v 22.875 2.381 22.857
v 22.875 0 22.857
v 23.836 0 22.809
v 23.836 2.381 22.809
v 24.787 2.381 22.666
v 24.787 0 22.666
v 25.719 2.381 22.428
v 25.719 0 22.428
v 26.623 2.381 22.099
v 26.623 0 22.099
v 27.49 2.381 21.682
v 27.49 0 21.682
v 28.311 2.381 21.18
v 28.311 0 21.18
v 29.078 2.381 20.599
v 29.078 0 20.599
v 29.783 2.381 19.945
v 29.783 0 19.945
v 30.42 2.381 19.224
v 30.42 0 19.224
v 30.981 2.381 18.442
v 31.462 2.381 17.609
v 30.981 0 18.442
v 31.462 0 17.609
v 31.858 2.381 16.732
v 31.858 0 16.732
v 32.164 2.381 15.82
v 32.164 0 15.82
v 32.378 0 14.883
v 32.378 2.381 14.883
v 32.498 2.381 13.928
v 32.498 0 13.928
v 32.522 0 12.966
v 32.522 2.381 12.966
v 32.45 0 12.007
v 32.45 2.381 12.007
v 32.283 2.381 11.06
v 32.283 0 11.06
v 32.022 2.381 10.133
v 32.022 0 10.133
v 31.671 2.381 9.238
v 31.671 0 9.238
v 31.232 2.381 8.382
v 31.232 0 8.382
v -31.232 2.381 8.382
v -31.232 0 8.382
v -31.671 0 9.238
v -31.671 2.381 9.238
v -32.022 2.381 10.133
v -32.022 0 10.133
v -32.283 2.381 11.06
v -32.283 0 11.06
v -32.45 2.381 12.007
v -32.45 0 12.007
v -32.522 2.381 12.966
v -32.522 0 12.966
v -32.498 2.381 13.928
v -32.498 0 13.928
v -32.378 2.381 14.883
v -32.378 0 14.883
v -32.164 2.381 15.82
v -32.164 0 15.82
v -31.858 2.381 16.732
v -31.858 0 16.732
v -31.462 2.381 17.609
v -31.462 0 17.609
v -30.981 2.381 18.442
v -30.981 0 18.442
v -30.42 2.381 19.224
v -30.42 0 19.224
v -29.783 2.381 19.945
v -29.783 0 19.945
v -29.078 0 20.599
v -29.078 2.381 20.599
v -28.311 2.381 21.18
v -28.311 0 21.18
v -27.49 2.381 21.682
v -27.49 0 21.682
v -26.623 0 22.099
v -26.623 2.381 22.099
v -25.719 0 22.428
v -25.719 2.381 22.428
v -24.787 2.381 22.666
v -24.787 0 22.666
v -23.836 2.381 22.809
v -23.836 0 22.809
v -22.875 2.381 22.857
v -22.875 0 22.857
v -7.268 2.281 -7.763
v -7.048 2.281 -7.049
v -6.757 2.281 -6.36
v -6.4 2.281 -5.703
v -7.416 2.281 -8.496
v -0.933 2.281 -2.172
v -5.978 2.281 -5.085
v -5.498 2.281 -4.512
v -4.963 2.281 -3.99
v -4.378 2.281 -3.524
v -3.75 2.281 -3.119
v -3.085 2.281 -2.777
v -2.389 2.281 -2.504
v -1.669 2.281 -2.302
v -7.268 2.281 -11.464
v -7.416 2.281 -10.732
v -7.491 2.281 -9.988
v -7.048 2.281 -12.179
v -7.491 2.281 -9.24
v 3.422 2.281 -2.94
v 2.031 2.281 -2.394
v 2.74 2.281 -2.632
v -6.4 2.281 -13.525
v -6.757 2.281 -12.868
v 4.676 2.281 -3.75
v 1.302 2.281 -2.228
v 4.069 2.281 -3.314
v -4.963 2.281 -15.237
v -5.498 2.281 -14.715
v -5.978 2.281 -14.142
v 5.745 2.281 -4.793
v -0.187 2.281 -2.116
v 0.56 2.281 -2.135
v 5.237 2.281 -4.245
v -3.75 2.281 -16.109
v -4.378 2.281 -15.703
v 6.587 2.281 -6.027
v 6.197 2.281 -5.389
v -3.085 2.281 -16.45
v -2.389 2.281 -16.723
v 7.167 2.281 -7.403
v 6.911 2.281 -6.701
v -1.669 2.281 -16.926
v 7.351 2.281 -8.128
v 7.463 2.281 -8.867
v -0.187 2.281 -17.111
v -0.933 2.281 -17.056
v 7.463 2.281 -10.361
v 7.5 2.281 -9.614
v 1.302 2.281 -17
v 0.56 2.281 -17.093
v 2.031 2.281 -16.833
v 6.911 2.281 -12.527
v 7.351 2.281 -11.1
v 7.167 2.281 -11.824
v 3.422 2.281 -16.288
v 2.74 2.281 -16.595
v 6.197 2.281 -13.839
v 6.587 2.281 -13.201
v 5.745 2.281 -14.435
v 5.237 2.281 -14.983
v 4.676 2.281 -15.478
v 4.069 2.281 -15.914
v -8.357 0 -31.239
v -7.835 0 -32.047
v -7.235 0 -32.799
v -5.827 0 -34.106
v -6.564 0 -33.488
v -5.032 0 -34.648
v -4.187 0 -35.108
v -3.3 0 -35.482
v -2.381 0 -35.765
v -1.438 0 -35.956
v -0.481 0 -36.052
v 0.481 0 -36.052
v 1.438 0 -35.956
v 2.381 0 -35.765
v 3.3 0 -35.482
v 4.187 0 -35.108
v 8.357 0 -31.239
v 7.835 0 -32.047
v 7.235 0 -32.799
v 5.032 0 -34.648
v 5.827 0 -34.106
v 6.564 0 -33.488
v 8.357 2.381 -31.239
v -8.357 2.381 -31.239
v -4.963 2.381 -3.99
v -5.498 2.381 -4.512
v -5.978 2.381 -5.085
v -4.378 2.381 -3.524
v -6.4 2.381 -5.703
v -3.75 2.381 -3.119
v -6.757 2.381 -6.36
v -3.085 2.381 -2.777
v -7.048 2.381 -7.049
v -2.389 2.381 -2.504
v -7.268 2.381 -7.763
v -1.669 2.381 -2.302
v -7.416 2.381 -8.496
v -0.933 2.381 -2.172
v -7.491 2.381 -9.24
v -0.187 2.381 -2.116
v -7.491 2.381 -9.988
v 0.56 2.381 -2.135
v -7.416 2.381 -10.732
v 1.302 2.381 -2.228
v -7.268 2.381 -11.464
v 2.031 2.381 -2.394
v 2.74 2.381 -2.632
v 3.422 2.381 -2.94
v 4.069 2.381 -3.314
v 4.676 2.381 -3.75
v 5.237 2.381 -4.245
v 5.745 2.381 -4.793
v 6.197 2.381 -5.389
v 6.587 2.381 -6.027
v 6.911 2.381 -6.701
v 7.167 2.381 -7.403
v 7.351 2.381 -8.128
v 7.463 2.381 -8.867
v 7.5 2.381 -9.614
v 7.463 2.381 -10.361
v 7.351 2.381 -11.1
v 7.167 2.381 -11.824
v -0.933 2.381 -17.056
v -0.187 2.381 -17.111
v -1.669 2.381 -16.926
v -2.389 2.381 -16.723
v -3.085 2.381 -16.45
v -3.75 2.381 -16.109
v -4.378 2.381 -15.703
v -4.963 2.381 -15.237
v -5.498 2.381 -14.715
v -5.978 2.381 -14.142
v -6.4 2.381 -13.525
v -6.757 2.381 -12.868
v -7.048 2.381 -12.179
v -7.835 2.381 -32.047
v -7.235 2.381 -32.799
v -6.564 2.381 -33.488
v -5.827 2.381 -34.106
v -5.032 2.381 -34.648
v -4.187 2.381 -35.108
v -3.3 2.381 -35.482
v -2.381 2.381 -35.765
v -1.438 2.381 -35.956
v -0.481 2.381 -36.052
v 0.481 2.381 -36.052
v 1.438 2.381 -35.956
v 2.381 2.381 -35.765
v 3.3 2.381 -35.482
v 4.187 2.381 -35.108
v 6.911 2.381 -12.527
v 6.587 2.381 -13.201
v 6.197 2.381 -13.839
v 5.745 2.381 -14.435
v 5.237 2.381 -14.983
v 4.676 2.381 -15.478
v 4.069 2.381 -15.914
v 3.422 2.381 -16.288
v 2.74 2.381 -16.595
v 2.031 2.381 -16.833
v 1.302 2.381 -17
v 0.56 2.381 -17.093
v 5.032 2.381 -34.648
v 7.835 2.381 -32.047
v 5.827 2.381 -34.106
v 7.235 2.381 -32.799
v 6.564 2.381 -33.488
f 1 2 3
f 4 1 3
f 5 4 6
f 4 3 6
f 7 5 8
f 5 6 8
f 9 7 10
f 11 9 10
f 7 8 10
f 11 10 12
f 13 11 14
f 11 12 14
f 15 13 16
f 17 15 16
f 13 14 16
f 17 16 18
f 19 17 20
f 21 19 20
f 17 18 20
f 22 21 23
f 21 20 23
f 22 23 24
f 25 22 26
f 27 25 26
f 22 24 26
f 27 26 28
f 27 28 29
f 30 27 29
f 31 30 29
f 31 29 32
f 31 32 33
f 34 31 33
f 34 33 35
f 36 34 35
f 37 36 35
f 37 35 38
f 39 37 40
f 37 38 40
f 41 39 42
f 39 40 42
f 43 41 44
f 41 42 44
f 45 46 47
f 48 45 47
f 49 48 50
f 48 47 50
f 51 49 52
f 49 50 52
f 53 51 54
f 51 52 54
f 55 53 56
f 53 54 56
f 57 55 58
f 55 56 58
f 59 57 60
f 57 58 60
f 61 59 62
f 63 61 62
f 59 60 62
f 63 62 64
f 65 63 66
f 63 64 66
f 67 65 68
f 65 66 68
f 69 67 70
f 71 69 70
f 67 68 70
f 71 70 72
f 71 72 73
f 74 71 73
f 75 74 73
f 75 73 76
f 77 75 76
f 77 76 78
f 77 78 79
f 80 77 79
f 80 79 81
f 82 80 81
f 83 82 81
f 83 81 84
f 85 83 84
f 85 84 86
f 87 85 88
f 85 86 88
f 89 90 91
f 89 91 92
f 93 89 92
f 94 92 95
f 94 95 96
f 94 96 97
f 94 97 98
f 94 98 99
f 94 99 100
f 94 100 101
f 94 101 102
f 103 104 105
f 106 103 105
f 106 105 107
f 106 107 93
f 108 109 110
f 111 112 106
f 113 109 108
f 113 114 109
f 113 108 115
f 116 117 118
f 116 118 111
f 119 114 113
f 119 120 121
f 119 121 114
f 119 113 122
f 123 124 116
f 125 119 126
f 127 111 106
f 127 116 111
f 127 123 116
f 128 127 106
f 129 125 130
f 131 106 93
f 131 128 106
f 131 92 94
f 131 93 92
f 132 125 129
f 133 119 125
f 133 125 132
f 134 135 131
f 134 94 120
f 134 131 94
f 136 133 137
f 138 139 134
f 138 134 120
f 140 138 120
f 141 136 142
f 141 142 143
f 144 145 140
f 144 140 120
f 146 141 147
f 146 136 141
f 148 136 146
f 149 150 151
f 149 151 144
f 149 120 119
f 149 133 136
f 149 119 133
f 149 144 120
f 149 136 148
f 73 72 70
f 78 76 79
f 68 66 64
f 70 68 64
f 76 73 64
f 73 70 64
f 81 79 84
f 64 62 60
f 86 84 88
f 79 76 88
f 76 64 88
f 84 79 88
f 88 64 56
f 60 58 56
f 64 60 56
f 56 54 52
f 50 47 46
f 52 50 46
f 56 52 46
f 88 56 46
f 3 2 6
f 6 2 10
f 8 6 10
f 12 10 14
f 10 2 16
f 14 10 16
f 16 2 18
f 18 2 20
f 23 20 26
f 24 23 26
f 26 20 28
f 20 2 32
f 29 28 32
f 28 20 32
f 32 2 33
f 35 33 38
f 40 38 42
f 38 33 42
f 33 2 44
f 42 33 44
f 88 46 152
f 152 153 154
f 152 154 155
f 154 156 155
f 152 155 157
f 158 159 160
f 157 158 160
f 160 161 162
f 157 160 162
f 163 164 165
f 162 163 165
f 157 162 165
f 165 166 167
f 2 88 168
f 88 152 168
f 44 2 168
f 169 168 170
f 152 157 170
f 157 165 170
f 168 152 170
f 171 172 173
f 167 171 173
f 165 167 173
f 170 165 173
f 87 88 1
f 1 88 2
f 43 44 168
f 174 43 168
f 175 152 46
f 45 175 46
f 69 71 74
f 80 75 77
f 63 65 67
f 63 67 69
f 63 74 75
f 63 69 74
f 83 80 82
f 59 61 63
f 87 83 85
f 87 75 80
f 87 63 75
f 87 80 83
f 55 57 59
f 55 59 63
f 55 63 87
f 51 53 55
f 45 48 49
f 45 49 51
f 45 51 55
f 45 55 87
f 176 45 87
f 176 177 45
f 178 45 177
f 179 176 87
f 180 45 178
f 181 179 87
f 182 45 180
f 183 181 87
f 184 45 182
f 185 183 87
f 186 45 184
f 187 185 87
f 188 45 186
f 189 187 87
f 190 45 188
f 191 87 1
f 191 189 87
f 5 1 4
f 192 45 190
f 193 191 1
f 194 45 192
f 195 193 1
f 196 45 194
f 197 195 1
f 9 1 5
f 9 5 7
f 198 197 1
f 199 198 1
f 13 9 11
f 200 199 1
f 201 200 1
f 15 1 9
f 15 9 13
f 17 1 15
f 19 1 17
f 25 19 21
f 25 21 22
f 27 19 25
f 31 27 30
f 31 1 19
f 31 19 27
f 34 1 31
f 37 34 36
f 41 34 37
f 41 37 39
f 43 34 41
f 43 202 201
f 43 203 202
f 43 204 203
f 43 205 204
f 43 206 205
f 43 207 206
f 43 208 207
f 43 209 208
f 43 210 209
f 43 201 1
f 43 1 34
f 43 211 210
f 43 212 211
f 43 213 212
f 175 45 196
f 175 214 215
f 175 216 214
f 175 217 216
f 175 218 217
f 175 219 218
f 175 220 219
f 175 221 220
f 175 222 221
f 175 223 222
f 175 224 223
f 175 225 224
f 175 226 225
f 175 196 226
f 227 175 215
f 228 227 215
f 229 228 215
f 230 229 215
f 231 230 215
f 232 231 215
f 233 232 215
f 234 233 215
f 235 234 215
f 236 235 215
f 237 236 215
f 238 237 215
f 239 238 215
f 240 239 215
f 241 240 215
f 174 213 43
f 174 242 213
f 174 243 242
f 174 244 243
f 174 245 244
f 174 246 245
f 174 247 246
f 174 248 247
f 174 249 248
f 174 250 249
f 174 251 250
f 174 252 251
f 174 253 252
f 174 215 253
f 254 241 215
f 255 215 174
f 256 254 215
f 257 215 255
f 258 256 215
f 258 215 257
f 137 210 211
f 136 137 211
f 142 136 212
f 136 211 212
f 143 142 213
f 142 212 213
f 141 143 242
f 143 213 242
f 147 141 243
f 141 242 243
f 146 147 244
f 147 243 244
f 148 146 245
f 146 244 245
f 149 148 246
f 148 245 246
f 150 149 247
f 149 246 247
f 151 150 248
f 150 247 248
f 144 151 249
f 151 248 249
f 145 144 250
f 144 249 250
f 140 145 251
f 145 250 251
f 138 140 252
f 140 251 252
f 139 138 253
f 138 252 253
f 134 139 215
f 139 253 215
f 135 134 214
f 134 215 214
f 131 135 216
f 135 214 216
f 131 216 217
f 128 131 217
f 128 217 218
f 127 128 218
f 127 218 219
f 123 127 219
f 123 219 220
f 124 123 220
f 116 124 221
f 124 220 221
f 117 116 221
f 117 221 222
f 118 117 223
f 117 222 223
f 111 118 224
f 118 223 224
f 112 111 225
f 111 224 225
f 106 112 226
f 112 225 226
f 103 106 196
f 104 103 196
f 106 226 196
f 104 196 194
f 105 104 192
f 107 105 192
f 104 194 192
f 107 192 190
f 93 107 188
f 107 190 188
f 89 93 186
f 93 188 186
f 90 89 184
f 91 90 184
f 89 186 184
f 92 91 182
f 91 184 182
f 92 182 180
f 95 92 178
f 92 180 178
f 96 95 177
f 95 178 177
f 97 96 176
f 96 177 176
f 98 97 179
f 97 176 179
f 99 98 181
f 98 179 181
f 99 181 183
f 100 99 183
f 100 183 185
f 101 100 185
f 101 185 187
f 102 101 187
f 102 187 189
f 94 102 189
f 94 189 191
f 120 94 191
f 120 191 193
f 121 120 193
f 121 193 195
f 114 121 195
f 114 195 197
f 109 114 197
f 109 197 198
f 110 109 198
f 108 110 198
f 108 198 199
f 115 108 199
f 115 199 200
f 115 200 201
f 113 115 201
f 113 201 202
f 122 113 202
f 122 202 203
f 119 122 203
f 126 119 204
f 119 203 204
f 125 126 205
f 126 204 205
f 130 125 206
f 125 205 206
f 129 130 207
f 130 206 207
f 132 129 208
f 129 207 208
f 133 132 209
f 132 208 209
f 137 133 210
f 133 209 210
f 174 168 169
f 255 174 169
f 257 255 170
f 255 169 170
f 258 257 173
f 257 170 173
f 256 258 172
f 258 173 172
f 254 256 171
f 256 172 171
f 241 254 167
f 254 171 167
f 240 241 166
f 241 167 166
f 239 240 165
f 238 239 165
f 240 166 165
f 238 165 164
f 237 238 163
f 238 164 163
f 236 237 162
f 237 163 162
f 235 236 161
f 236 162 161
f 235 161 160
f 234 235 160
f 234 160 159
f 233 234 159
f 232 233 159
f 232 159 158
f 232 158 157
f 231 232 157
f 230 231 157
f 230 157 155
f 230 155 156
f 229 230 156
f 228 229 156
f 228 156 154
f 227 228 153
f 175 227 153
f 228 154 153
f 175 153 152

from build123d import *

# Parameters (mm, degrees)
BOSS_EXTRUDE1_DEPTH = 2.38125
SKETCH2_R           = 7.5
CUT_EXTRUDE1_DEPTH  = 0.1


with BuildPart() as part:
    # Sketch1 → Boss-Extrude1 (new body)
    with BuildSketch(Plane(origin=(0, 0, 0), x_dir=(1, 0, 0), z_dir=(0, 1, 0))):
        with BuildLine():
            Line((-8.357145147, 31.238774815), (-31.232145147, -8.381887408))
            ThreePointArc((-31.232145147, -8.381887408), (-31.232145147, -18.031887408), (-22.875, -22.856887408))
            Line((-22.875, -22.856887408), (22.875, -22.856887408))
            ThreePointArc((22.875, -22.856887408), (31.232145147, -18.031887408), (31.232145147, -8.381887408))
            Line((31.232145147, -8.381887408), (8.357145147, 31.238774815))
            ThreePointArc((8.357145147, 31.238774815), (0, 36.063774815), (-8.357145147, 31.238774815))
        make_face()
    extrude(amount=BOSS_EXTRUDE1_DEPTH)

    # Sketch2 → Cut-Extrude1 (cut)
    with BuildSketch(Plane(origin=(0, 2.38125, 0), x_dir=(1, 0, 0), z_dir=(0, 1, 0))):
        with Locations((0, 9.613774815)):
            Circle(SKETCH2_R)
    extrude(amount=-CUT_EXTRUDE1_DEPTH, mode=Mode.SUBTRACT)


solid = part.part
